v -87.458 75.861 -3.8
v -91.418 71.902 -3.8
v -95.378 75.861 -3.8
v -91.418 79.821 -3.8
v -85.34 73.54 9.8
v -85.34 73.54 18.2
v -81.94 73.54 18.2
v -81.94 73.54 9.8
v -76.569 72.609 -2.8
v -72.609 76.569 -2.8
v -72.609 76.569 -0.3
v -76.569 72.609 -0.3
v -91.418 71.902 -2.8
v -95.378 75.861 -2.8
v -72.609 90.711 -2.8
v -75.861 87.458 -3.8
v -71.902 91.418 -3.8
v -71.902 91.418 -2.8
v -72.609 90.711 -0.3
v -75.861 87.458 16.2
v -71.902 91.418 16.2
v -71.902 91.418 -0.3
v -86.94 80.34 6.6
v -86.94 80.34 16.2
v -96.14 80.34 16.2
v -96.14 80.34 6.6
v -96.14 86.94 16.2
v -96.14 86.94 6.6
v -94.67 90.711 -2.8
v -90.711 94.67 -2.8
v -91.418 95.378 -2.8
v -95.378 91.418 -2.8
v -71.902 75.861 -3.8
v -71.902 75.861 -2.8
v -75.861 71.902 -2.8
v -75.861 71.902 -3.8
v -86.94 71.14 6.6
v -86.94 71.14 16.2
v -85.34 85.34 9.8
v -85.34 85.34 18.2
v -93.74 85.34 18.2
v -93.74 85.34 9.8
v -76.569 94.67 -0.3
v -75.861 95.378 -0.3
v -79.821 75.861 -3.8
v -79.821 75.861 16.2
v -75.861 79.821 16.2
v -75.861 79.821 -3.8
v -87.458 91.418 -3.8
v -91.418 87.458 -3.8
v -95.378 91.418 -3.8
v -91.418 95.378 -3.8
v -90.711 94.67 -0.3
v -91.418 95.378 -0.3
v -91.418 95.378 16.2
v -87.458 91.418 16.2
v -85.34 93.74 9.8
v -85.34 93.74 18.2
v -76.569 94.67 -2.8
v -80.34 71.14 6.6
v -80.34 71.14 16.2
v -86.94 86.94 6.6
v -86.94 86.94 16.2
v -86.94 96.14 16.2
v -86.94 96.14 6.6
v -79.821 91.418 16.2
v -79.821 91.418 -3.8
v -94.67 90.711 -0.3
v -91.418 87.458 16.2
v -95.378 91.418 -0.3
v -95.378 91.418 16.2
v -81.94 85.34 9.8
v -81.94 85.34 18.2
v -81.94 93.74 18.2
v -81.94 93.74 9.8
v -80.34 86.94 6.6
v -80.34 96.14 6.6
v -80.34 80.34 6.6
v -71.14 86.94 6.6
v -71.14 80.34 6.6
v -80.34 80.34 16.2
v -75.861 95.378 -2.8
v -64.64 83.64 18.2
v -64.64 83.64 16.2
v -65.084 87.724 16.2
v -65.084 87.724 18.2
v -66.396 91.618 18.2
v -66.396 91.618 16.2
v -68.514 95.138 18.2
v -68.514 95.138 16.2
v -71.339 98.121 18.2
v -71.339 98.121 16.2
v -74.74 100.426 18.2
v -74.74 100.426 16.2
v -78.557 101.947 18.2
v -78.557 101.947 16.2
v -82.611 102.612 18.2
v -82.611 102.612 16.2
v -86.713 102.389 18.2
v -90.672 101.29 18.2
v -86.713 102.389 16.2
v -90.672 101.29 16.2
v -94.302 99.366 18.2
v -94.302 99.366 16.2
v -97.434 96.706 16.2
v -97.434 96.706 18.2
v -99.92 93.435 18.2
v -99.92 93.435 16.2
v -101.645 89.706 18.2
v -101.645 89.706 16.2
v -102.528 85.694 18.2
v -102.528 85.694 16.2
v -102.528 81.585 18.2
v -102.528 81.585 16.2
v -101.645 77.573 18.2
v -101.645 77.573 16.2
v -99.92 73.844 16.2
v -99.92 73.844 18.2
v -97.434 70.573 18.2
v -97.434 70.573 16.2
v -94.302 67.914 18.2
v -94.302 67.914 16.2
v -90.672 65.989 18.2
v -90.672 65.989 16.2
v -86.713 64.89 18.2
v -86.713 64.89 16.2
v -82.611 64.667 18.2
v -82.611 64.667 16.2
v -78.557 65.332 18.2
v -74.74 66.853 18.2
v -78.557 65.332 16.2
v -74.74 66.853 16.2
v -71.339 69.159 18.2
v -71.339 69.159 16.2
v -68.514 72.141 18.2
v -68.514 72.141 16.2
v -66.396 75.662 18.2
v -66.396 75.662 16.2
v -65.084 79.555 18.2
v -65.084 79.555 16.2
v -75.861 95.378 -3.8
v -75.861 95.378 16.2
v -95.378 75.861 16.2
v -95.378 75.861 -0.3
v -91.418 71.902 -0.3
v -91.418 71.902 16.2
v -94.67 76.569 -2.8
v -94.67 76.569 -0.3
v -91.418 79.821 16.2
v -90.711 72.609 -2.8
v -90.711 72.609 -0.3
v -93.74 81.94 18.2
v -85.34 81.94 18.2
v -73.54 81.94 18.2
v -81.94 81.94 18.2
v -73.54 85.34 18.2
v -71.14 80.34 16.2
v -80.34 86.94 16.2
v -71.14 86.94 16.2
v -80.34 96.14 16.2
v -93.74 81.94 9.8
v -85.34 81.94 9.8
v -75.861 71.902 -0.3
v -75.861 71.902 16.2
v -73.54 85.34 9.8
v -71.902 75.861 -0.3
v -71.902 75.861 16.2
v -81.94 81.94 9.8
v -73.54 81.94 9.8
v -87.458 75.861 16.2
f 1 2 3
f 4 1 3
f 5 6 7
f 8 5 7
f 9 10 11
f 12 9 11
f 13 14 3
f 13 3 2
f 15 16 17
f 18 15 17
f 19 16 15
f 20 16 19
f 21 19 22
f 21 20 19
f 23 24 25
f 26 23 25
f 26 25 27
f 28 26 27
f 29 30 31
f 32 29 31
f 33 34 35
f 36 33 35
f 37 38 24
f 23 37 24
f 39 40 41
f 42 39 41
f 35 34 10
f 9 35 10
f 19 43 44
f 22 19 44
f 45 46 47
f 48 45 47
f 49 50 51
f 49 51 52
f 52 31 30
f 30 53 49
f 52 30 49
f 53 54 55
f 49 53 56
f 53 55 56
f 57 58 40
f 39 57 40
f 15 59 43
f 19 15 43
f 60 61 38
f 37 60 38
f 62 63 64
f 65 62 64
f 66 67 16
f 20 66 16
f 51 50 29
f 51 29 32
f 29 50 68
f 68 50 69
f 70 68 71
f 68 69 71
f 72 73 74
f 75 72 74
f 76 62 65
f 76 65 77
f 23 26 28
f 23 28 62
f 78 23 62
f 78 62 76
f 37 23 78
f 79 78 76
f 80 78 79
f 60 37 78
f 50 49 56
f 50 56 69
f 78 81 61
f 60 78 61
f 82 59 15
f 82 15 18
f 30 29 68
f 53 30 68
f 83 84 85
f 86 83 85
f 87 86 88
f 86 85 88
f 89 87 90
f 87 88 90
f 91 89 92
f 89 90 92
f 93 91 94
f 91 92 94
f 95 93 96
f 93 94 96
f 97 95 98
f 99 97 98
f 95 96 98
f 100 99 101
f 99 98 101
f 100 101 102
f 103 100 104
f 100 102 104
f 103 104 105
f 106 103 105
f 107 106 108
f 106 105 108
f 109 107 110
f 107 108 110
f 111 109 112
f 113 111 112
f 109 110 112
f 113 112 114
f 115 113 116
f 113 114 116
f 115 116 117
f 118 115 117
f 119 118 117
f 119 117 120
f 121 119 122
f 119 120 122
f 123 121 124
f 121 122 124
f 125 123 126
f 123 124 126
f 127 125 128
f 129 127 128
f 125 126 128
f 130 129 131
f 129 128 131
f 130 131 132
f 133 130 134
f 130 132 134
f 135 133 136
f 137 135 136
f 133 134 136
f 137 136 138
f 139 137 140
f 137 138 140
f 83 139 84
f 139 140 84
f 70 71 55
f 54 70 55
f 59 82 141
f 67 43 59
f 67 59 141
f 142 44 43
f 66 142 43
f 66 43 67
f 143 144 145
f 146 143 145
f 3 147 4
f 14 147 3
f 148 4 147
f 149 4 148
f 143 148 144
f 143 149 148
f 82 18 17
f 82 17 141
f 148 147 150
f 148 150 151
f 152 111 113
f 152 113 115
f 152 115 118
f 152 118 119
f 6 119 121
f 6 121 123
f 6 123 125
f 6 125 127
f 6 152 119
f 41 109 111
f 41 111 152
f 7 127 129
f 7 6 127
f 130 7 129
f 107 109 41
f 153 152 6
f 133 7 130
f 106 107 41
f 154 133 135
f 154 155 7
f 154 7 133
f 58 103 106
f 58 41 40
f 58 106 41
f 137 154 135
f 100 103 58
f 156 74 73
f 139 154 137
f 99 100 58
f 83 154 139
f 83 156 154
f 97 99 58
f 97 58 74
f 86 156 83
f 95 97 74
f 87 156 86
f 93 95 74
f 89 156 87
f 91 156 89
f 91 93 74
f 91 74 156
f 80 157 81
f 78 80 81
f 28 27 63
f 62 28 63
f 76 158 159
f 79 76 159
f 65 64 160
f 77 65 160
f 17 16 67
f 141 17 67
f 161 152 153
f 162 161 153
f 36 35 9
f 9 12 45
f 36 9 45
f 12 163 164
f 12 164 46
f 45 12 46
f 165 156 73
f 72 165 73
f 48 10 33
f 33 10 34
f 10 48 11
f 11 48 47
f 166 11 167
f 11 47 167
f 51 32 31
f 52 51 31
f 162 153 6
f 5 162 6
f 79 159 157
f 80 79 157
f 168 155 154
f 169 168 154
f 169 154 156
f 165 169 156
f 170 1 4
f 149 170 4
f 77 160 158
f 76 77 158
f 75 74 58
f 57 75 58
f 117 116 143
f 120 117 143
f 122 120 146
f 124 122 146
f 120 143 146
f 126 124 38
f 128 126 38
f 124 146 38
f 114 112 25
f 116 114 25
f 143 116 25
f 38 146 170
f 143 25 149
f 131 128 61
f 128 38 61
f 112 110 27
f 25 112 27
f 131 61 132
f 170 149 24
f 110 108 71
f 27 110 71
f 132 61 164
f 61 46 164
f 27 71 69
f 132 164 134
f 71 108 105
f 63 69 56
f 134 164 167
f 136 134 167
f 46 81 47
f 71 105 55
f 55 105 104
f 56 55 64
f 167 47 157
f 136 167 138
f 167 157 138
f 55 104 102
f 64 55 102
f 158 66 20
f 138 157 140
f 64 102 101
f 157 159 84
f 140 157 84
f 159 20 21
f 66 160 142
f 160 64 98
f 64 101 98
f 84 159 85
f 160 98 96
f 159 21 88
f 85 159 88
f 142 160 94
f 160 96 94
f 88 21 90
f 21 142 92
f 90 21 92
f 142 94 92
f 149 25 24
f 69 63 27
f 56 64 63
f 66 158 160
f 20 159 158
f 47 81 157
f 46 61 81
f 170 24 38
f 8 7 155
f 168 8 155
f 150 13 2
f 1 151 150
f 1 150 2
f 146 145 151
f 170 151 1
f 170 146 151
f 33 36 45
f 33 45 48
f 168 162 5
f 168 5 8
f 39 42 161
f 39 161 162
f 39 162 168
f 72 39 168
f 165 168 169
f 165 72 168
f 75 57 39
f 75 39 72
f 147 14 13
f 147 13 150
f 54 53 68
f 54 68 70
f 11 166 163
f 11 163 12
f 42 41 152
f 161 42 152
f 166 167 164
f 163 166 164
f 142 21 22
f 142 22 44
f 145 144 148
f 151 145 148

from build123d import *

# Parameters (mm, degrees)
SKETCH056_R     = 19
PAD035_DEPTH    = 2
PAD036_DEPTH    = 9.6
POCKET021_DEPTH = 8.4
PAD037_DEPTH    = 20
SKETCH060_W     = 1
SKETCH060_H     = 2.5
POCKET022_DEPTH = 29.6710576851
SKETCH061_W     = 1
SKETCH061_H     = 2.5
POCKET023_DEPTH = 29.6710576851
SKETCH062_W     = 1
SKETCH062_H     = 2.5
POCKET024_DEPTH = 29.6710576851


with BuildPart() as part:
    # Sketch056 (on Face61 of Binder011) → Pad035 (new body)
    with BuildSketch(Plane.XY.offset(16.2)):
        with Locations((-83.6396103068, 83.6396103068)):
            Circle(SKETCH056_R)
    extrude(amount=PAD035_DEPTH)

    # Sketch057 (on Face2 of Pad035) → Pad036 (join)
    with BuildSketch(Plane(origin=(0, 0, 16.2), x_dir=(1, 0, 0), z_dir=(0, 0, -1))):
        Polygon((-96.1396103068, -80.3396103068), (-96.1396103068, -86.9396103068), (-86.9396103068, -86.9396103068), (-86.9396103068, -96.1396103068), (-80.3396103068, -96.1396103068), (-80.3396103068, -86.9396103068), (-71.1396103068, -86.9396103068), (-71.1396103068, -80.3396103068), (-80.3396103068, -80.3396103068), (-80.3396103068, -71.1396103068), (-86.9396103068, -71.1396103068), (-86.9396103068, -80.3396103068), align=None)
    extrude(amount=PAD036_DEPTH)

    # Sketch058 (on Face3 of Pad036) → Pocket021 (cut)
    with BuildSketch(Plane.XY.offset(18.2)):
        Polygon((-85.3396103068, 93.7396103068), (-85.3396103068, 85.3396103068), (-93.7396103068, 85.3396103068), (-93.7396103068, 81.9396103068), (-85.3396103068, 81.9396103068), (-85.3396103068, 73.5396103068), (-81.9396103068, 73.5396103068), (-81.9396103068, 81.9396103068), (-73.5396103068, 81.9396103068), (-73.5396103068, 85.3396103068), (-81.9396103068, 85.3396103068), (-81.9396103068, 93.7396103068), align=None)
    extrude(amount=-POCKET021_DEPTH, mode=Mode.SUBTRACT)

    # Sketch059 (on Face2 of Pocket021) → Pad037 (join)
    with BuildSketch(Plane(origin=(0, 0, 16.2), x_dir=(1, 0, 0), z_dir=(0, 0, -1))):
        Polygon((-91.4177848998, -71.9016377391), (-87.4579869252, -75.8614357137), (-91.4177848998, -79.8212336884), (-95.3775828745, -75.8614357137), align=None)
        Polygon((-91.4177848998, -87.4579869252), (-95.3775828745, -91.4177848998), (-91.4177848998, -95.3775828745), (-87.4579869252, -91.4177848998), align=None)
        Polygon((-75.8614357137, -71.9016377391), (-79.8212336884, -75.8614357137), (-75.8614357137, -79.8212336884), (-71.9016377391, -75.8614357137), align=None)
        Polygon((-79.8212336884, -91.4177848998), (-75.8614357137, -87.4579869252), (-71.9016377391, -91.4177848998), (-75.8614357137, -95.3775828745), align=None)
    extrude(amount=PAD037_DEPTH)

    # Sketch060 (on Face13 of Pad037) → Pocket022 (cut, through all)
    with BuildSketch(Plane(origin=(1.9798989873, 1.9798989873, 0), x_dir=(-0.7071067812, 0.7071067812, 0), z_dir=(0.7071067812, 0.7071067812, 0))):
        with Locations((131.5842712475, -1.55)):
            Rectangle(SKETCH060_W, SKETCH060_H)
    extrude(amount=-POCKET022_DEPTH, mode=Mode.SUBTRACT)

    # Sketch061 (on Face9 of Pocket022) → Pocket023 (cut, through all)
    with BuildSketch(Plane(origin=(1.9798989873, 1.9798989873, 0), x_dir=(-0.7071067812, 0.7071067812, 0), z_dir=(0.7071067812, 0.7071067812, 0))):
        with Locations((104.9842712475, -1.55)):
            Rectangle(SKETCH061_W, SKETCH061_H)
    extrude(amount=-POCKET023_DEPTH, mode=Mode.SUBTRACT)

    # Sketch062 (on Face29 of Pocket023) → Pocket024 (cut, through all)
    with BuildSketch(Plane(origin=(-81.6597113195, 81.6597113195, 0), x_dir=(0.7071067812, 0.7071067812, 0), z_dir=(0.7071067812, -0.7071067812, 0))):
        with Locations((13.3, -1.55)):
            Rectangle(SKETCH062_W, SKETCH062_H)
        with Locations((-13.3, -1.55)):
            Rectangle(SKETCH062_W, SKETCH062_H)
    extrude(amount=-POCKET024_DEPTH, mode=Mode.SUBTRACT)


solid = part.part
